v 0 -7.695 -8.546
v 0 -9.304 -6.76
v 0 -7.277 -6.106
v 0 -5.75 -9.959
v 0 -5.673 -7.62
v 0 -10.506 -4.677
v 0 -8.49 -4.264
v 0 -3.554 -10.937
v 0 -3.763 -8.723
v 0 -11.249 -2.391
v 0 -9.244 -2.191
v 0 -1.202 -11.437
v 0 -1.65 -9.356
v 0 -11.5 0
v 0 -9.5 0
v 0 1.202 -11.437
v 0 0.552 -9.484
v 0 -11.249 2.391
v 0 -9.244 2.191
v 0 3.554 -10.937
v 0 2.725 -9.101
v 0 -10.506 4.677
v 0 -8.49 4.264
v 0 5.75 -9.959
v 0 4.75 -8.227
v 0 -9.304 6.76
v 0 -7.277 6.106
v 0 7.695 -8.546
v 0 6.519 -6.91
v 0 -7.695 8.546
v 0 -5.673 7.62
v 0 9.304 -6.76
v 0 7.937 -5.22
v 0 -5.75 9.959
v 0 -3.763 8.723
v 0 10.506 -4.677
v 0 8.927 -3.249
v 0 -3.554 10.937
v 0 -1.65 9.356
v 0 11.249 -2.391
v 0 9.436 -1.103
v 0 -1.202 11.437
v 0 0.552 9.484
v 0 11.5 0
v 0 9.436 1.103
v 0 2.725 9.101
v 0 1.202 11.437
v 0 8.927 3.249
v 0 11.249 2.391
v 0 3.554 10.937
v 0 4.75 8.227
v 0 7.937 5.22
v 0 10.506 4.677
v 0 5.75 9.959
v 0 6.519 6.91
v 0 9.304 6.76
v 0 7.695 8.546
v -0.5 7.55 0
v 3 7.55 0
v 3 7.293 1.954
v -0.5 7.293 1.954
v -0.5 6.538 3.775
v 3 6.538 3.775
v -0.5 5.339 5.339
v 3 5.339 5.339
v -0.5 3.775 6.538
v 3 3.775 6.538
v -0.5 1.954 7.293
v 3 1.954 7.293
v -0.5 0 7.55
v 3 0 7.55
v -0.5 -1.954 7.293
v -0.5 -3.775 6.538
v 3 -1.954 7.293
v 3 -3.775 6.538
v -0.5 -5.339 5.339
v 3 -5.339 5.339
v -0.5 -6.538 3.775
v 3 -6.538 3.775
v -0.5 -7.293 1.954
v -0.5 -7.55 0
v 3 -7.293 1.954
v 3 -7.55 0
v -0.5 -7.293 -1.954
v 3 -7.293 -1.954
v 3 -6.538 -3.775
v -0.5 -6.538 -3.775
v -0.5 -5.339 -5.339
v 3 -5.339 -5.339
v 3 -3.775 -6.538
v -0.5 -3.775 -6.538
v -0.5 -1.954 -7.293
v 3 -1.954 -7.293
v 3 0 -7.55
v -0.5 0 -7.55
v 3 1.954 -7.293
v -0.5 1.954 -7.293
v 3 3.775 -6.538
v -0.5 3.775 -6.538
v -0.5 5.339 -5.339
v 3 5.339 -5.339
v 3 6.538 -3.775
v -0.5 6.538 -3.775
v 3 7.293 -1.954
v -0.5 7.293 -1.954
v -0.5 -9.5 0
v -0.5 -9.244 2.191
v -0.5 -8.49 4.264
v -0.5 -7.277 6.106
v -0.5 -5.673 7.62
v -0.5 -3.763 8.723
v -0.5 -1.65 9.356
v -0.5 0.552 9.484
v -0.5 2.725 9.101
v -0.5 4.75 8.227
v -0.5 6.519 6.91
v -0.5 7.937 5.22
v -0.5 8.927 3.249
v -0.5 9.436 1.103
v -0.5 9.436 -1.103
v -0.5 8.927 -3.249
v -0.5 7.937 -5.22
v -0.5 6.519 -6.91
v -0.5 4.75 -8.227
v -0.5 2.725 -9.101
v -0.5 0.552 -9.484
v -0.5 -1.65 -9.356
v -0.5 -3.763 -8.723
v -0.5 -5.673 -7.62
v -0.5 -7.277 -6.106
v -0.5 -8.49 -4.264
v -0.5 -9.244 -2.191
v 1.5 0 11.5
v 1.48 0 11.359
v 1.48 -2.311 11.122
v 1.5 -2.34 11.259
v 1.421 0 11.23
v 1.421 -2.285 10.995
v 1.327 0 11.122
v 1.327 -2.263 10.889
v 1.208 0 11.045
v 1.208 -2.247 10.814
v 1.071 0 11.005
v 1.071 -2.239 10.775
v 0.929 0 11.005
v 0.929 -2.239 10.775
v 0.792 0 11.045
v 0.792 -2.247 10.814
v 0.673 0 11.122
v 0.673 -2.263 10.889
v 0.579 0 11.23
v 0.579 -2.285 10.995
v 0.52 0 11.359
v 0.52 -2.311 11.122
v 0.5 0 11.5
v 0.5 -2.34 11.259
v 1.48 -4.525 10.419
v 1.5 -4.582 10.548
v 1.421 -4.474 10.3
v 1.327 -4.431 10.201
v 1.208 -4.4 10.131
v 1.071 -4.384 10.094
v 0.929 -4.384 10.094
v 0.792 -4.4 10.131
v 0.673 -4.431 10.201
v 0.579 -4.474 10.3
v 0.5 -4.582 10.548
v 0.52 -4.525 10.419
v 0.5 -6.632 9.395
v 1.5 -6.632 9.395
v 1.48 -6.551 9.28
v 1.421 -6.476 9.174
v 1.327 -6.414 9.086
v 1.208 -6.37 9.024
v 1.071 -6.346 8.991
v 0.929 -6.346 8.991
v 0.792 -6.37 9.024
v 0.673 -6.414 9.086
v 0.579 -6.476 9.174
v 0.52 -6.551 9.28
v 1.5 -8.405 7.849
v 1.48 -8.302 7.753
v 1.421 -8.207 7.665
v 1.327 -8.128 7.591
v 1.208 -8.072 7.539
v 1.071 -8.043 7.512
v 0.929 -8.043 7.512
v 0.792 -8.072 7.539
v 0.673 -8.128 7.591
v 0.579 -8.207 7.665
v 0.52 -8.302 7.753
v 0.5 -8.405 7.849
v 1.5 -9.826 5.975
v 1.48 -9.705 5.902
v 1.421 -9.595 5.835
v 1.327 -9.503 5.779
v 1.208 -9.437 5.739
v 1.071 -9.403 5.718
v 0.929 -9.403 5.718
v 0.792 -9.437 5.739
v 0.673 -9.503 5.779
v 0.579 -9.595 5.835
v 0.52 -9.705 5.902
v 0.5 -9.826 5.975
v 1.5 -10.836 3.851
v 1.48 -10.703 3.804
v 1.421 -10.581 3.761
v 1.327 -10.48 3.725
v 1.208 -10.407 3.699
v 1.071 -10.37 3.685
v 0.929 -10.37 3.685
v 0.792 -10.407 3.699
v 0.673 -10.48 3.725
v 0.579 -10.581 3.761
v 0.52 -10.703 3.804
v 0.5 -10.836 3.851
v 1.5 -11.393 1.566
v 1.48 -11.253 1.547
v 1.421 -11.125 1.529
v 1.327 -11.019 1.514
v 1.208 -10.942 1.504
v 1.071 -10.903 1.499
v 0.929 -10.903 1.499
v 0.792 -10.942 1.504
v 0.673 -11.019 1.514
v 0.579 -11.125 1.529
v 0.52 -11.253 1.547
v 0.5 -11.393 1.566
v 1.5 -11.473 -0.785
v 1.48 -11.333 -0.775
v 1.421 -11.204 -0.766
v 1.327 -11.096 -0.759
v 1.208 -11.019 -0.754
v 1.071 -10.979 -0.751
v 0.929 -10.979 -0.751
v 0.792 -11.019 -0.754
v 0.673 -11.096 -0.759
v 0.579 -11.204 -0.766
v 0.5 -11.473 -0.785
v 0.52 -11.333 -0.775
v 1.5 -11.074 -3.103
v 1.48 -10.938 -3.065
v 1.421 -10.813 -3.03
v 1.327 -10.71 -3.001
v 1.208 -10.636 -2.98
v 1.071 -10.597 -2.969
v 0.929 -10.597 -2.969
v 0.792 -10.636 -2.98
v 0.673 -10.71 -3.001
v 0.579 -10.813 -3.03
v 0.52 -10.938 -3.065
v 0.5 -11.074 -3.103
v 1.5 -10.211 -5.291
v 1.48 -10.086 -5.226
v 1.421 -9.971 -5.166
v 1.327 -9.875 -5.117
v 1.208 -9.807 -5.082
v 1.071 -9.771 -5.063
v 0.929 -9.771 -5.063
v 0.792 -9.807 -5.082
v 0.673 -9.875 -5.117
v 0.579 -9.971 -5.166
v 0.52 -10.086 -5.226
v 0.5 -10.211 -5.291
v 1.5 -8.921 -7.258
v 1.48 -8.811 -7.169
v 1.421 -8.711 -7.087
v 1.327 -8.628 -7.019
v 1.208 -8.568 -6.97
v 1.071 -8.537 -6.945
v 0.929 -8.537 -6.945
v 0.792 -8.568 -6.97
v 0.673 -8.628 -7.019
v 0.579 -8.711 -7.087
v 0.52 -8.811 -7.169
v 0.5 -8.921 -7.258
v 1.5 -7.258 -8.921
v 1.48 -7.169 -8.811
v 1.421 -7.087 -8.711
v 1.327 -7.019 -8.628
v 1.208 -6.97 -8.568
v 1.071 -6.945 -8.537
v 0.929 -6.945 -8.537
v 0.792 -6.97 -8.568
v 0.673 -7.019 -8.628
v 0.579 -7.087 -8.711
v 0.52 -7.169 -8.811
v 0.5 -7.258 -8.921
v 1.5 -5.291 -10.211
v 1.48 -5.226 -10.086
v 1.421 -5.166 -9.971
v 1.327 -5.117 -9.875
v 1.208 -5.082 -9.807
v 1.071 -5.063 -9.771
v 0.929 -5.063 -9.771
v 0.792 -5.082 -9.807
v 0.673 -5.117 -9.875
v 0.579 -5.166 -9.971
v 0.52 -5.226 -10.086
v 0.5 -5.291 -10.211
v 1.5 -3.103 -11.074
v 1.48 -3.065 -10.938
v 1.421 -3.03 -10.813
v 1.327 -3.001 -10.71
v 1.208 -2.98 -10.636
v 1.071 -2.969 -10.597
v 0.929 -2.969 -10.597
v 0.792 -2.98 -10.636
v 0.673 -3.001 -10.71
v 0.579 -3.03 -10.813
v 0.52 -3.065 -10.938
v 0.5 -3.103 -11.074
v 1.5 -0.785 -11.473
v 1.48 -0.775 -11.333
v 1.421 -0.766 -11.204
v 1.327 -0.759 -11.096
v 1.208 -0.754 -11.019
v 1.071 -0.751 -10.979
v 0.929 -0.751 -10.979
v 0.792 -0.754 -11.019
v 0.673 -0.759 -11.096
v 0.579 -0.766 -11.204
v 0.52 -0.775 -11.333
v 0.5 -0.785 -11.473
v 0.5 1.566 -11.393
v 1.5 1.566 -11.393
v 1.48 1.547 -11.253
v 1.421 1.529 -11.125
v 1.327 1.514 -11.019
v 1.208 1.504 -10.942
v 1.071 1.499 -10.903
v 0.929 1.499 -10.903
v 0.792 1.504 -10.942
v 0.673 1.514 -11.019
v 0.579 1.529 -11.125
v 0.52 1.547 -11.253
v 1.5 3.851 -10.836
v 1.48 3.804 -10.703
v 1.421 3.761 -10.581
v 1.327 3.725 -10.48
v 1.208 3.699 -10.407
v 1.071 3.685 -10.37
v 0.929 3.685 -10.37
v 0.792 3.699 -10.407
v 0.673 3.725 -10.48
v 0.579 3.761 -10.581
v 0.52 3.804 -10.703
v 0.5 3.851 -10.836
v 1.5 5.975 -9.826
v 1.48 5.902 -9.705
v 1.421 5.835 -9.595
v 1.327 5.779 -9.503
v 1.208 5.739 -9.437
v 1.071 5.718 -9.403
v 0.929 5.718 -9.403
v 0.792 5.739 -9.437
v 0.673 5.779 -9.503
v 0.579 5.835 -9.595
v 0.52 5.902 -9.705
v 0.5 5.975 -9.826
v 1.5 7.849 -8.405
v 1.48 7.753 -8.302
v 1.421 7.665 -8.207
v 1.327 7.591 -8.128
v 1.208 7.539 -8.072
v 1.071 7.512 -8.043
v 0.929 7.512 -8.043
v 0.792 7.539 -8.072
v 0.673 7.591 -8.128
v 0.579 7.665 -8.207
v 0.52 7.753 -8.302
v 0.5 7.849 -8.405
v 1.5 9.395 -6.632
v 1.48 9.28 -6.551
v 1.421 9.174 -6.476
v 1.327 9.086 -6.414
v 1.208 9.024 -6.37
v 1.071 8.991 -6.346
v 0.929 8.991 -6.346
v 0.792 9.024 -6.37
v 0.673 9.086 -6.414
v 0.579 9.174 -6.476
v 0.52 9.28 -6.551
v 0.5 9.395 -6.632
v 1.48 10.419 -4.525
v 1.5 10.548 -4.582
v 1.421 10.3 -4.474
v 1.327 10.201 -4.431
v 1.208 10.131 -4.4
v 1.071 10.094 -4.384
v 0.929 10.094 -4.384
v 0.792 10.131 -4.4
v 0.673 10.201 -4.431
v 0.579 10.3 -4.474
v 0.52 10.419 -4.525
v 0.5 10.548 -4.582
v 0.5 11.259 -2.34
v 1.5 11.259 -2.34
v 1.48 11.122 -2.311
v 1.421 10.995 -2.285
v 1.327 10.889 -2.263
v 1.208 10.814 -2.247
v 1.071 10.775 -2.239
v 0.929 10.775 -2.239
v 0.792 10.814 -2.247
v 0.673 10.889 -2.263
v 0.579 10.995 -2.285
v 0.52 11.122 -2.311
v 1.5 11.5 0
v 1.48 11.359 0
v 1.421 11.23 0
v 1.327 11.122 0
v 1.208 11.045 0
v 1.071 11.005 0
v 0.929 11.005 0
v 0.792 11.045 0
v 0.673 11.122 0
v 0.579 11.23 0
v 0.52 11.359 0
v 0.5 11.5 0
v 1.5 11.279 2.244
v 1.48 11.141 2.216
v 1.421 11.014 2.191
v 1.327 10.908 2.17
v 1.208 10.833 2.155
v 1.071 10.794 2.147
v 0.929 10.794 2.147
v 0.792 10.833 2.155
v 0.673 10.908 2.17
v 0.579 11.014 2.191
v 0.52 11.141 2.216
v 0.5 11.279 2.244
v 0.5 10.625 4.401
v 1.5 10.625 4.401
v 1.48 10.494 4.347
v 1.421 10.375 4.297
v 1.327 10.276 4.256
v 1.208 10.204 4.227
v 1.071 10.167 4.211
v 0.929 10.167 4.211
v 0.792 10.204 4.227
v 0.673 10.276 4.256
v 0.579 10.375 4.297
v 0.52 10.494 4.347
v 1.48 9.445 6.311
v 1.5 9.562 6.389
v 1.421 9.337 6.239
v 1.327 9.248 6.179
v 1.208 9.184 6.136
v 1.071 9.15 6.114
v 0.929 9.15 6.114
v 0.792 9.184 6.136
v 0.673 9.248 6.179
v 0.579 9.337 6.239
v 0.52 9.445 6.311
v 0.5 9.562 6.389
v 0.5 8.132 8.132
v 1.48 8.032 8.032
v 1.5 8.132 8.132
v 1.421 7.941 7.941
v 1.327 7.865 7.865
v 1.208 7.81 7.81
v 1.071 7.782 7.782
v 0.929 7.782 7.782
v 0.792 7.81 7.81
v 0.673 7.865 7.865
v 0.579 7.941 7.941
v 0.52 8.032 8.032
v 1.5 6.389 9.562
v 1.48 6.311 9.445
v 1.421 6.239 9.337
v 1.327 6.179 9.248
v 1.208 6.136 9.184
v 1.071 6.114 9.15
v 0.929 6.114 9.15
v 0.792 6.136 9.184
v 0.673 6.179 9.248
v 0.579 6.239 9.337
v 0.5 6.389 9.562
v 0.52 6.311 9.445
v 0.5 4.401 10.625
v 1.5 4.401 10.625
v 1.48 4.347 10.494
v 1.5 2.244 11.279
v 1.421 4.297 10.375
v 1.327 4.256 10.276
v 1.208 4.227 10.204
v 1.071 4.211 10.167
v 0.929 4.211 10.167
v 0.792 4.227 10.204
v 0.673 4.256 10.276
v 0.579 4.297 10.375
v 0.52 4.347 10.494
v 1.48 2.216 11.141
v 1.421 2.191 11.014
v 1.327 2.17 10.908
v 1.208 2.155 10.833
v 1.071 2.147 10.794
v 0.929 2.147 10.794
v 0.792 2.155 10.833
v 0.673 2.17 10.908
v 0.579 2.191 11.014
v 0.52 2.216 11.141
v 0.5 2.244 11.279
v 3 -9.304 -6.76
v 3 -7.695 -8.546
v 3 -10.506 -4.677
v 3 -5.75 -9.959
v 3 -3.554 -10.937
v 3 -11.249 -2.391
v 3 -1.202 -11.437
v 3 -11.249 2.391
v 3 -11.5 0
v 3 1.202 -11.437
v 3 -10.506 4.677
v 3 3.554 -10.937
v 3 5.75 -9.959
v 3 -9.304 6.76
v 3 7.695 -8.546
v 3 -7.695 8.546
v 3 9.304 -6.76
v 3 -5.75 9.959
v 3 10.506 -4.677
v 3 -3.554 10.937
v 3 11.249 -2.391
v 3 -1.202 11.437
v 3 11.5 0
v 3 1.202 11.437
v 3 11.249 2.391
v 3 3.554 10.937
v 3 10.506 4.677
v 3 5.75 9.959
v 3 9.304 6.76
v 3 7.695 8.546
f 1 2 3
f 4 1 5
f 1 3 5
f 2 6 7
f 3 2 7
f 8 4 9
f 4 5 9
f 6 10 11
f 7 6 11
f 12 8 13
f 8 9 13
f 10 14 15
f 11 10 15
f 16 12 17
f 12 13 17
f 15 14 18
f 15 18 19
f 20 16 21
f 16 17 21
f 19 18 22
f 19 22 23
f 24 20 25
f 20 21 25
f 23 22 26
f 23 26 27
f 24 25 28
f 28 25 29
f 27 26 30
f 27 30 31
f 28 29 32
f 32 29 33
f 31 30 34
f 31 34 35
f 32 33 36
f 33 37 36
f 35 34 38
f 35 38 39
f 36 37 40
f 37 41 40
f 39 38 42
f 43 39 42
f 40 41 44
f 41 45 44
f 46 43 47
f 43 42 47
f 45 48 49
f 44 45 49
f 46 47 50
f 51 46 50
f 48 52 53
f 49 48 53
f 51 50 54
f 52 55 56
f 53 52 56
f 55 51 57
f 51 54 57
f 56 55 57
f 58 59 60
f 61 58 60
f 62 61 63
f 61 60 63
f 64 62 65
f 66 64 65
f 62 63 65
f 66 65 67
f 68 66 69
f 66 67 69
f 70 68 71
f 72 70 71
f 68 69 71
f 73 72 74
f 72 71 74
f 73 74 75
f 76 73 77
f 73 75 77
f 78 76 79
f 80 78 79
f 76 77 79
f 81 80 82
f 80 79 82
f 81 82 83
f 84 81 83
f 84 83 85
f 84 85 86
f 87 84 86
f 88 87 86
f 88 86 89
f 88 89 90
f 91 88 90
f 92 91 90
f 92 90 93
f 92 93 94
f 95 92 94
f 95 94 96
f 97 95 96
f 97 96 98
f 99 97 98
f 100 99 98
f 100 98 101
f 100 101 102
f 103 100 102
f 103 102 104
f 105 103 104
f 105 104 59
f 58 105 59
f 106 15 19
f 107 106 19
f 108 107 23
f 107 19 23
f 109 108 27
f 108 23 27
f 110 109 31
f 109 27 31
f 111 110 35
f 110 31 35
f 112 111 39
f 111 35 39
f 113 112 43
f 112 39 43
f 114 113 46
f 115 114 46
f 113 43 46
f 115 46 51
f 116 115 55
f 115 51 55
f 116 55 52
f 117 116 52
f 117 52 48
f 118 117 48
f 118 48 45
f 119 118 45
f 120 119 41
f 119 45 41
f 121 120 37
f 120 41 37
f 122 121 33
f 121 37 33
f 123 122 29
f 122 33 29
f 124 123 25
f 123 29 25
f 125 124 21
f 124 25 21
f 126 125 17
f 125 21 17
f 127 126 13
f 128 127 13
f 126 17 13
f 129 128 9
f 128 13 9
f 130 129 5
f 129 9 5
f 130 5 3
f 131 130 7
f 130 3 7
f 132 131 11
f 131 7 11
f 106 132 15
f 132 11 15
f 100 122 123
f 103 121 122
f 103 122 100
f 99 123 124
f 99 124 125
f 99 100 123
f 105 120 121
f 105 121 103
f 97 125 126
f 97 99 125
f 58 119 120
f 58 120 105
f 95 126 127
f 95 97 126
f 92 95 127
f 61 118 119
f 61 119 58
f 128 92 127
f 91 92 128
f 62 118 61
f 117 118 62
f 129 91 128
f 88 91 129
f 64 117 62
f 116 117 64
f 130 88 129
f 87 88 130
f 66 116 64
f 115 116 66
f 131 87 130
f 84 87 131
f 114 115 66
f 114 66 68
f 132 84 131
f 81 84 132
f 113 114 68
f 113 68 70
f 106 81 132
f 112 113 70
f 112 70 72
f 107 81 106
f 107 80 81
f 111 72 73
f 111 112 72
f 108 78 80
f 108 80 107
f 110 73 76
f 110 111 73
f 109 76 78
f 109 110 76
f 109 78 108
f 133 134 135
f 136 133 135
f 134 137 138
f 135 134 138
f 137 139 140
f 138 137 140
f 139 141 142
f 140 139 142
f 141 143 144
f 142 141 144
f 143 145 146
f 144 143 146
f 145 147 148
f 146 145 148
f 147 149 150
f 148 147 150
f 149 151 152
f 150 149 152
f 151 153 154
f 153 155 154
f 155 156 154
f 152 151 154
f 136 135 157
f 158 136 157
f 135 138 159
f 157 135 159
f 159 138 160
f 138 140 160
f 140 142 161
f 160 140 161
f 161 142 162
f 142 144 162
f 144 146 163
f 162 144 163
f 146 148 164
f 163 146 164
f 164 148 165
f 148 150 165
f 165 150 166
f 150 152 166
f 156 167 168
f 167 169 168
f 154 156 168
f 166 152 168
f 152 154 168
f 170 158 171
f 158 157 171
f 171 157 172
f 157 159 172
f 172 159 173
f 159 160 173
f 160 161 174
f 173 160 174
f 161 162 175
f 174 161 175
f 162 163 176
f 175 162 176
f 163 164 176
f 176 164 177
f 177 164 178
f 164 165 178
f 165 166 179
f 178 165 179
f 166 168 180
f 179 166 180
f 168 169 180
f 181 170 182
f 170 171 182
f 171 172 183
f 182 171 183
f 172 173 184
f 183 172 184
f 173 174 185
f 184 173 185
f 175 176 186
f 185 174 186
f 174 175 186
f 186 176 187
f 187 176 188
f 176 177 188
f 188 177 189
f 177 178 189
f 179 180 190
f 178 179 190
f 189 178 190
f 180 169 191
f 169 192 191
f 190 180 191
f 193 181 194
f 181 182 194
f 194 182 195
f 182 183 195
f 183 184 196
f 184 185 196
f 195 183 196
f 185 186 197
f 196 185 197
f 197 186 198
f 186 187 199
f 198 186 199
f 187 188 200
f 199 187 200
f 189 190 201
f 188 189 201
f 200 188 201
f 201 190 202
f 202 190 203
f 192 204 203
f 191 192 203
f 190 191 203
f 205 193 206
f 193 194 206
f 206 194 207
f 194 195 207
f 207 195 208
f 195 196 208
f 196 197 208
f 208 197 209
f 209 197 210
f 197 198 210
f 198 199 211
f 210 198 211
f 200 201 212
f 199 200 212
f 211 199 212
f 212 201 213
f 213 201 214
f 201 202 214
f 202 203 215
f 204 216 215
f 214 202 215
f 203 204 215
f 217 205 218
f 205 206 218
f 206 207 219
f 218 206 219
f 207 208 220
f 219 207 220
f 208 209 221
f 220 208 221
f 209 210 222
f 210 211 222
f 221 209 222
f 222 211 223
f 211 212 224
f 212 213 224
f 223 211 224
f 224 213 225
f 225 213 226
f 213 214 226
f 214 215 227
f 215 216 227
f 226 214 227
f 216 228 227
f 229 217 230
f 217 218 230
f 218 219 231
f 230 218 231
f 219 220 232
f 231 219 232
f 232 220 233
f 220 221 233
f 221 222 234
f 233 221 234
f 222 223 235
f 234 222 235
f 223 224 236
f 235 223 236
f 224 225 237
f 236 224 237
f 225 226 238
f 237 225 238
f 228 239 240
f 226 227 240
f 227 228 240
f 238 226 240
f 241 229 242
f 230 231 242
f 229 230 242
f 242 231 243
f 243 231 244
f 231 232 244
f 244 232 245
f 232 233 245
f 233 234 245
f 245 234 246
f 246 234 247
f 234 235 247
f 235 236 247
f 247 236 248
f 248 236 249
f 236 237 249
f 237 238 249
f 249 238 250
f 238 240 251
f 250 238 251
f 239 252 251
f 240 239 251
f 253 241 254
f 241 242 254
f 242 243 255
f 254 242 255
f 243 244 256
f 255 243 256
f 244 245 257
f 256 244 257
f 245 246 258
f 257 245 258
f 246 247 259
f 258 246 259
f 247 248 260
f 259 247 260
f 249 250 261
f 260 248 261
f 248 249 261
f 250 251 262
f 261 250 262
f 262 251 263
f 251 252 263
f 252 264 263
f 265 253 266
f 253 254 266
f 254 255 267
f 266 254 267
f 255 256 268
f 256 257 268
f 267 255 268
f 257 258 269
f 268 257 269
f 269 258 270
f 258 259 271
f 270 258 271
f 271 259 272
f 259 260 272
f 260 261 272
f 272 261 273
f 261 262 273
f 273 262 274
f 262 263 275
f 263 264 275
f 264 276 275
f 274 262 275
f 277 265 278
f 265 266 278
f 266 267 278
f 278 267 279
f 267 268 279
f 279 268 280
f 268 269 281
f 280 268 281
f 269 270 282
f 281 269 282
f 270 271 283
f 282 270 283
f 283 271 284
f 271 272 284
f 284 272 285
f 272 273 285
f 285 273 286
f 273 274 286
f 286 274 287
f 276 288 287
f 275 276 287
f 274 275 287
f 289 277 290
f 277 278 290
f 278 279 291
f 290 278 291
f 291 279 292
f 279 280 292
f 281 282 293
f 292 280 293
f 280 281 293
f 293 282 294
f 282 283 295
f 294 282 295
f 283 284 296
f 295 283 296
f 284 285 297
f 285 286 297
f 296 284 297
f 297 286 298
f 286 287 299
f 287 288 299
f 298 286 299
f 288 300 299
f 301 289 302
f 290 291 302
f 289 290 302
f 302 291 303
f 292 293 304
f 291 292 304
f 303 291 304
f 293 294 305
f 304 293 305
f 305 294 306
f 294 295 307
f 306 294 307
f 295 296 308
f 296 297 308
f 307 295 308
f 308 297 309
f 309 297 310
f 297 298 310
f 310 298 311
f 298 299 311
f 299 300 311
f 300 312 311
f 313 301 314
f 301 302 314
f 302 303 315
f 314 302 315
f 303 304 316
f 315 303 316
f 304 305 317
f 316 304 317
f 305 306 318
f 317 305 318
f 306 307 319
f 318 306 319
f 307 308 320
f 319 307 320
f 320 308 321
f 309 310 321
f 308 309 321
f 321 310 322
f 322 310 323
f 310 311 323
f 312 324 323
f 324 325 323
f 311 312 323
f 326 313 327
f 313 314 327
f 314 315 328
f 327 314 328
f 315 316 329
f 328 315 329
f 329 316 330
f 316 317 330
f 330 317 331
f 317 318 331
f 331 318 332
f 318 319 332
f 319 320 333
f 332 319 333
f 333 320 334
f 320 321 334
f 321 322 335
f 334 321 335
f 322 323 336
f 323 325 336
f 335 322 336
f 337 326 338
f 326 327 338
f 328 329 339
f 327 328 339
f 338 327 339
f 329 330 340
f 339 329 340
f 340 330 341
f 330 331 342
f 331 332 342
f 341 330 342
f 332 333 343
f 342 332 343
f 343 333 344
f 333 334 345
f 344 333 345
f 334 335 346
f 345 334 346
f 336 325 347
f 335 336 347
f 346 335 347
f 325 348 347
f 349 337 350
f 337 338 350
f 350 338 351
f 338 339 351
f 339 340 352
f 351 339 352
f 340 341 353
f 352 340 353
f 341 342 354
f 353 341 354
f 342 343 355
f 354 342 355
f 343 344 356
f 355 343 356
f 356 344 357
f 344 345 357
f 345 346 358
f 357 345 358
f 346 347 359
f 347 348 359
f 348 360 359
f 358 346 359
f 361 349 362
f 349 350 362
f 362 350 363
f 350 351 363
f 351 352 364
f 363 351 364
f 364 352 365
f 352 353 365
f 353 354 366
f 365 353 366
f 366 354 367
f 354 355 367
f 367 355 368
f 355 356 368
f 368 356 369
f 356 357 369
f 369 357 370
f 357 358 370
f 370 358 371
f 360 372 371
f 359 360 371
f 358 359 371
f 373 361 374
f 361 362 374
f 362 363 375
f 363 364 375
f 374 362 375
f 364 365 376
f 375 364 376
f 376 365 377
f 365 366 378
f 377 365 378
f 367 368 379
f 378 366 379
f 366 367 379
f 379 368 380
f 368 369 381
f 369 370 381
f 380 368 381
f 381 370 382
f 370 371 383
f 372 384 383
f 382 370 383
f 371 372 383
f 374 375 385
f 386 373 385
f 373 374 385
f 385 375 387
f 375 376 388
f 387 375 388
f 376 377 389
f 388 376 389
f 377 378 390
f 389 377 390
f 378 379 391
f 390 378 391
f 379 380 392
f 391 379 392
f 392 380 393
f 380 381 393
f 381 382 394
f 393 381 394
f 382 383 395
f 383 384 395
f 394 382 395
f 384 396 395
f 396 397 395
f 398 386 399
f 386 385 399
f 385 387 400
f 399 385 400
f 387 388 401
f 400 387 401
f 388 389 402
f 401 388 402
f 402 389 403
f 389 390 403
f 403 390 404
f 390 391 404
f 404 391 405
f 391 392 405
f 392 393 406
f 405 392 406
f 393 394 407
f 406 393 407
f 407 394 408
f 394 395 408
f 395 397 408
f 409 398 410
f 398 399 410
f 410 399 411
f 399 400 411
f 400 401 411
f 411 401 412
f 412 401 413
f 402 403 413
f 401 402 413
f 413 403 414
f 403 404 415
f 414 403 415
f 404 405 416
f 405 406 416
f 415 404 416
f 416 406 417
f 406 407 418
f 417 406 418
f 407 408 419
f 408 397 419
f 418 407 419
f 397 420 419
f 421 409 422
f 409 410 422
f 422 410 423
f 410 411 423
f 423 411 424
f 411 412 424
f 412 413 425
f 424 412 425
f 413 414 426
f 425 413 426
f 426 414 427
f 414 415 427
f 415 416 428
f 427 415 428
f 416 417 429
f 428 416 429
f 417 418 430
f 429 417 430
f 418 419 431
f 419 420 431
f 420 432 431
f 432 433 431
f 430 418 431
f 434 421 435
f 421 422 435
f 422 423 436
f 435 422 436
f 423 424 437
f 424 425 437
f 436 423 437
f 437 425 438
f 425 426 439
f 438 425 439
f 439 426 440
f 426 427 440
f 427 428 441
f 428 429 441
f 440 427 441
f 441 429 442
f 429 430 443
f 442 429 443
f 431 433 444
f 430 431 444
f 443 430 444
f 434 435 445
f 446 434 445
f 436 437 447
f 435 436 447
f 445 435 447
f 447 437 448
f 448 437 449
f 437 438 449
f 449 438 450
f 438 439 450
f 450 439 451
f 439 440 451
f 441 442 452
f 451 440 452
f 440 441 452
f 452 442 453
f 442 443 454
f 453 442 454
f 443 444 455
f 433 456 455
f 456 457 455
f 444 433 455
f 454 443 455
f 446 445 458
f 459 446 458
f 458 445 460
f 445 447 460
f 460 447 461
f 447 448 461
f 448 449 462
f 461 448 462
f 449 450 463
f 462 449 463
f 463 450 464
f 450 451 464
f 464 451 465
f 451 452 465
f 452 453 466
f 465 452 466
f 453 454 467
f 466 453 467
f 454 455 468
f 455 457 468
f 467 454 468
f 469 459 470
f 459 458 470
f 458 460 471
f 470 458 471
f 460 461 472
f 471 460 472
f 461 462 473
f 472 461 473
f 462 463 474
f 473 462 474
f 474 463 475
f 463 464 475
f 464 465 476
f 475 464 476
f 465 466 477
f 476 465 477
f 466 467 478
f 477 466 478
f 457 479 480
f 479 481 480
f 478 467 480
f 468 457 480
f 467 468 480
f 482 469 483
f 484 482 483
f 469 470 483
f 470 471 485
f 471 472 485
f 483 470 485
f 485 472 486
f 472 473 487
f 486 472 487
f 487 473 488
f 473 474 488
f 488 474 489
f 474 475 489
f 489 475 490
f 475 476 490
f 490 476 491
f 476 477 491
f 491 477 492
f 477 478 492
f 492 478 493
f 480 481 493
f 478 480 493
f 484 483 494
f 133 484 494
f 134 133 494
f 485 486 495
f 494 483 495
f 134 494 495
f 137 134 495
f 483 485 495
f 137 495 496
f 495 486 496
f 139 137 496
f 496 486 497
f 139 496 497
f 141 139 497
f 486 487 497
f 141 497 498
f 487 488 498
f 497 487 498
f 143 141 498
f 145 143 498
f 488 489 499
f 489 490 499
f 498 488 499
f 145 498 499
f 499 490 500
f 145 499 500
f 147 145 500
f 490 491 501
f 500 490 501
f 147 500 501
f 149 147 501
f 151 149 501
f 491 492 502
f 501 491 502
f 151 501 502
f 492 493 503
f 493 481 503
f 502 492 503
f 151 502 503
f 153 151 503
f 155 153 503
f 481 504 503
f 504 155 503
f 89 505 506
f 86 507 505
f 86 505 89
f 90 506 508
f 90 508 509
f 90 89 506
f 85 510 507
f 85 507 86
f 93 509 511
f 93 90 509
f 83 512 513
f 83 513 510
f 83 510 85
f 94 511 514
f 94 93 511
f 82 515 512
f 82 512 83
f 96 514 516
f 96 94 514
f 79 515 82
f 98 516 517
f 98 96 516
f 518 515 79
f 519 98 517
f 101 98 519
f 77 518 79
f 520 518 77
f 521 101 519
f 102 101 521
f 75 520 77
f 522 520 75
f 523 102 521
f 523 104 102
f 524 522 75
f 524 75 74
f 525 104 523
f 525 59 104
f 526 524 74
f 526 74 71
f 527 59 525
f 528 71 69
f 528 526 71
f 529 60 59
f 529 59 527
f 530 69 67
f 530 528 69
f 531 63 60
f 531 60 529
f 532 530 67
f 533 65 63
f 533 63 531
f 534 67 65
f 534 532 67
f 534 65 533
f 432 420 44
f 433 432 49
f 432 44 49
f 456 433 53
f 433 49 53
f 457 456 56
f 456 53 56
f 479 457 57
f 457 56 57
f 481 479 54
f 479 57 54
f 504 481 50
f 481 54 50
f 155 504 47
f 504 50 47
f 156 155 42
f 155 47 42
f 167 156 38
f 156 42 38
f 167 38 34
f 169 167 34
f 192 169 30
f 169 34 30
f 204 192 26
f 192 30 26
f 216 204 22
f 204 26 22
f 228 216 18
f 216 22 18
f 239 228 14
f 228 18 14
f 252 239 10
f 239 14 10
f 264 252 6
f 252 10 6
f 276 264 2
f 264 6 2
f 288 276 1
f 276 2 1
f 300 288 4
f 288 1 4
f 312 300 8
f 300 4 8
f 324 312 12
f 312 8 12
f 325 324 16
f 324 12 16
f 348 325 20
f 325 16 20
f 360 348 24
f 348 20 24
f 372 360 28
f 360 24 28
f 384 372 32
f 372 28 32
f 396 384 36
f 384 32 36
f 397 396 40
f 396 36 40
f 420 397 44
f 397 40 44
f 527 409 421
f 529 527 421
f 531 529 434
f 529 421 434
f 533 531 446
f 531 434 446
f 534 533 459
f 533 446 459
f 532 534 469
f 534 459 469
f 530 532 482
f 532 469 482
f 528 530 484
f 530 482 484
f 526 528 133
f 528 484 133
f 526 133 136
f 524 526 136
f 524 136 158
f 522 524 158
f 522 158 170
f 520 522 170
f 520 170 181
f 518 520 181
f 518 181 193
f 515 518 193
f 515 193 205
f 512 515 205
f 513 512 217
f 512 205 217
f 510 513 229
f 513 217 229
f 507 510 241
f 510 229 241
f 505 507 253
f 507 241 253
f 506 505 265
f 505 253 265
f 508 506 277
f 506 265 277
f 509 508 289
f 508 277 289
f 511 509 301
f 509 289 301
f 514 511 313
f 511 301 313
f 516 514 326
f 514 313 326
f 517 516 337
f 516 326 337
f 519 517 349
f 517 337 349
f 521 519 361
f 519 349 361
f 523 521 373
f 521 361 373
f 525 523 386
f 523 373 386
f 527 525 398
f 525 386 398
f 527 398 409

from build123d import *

# Parameters (mm, degrees)
F0_R     = 11.5
F1_DEPTH = 3
F2_R     = 9.5
F3_DEPTH = 0.5
F5_D     = 15.1
F5_DEPTH = 30
F5_TIP   = 4.5364976737
F6_R     = 0.5


with BuildPart() as f1:
    # F0 (on Right) → F1 (new body)
    with BuildSketch(Plane.YZ):
        Circle(F0_R)
    extrude(amount=F1_DEPTH)

    # F2 (on face) → F3 (join)
    with BuildSketch(Plane(origin=(0, 0, 0), x_dir=(0, -1, 0), z_dir=(-1, 0, 0))):
        Circle(F2_R)
    extrude(amount=F3_DEPTH)

    # F5
    with Locations(Plane(origin=(-0.5, 0, 0), x_dir=(0, -1, 0), z_dir=(-1, 0, 0))):
        with Locations((0, 0)):
            Hole(F5_D / 2, depth=F5_DEPTH)
            with Locations((0, 0, -(F5_DEPTH + F5_TIP / 2))):  # 118° drill point
                Cone(0, F5_D / 2, F5_TIP, mode=Mode.SUBTRACT)

    # F7: sweep along a path in F7_path
    with BuildLine(Plane(origin=(0, 11.5, 0), x_dir=(0, 0, 1), z_dir=(1, 0, 0))) as f7_path:
        CenterArc((0, 11.5), 11.5, 0, 360)
    # F6 (on Front) → F7 (sweep, cut)
    with BuildSketch(Plane.XZ):
        with Locations((1, -11.5)):
            Circle(F6_R)
    sweep(path=f7_path.line, mode=Mode.SUBTRACT)


solid = f1.part
